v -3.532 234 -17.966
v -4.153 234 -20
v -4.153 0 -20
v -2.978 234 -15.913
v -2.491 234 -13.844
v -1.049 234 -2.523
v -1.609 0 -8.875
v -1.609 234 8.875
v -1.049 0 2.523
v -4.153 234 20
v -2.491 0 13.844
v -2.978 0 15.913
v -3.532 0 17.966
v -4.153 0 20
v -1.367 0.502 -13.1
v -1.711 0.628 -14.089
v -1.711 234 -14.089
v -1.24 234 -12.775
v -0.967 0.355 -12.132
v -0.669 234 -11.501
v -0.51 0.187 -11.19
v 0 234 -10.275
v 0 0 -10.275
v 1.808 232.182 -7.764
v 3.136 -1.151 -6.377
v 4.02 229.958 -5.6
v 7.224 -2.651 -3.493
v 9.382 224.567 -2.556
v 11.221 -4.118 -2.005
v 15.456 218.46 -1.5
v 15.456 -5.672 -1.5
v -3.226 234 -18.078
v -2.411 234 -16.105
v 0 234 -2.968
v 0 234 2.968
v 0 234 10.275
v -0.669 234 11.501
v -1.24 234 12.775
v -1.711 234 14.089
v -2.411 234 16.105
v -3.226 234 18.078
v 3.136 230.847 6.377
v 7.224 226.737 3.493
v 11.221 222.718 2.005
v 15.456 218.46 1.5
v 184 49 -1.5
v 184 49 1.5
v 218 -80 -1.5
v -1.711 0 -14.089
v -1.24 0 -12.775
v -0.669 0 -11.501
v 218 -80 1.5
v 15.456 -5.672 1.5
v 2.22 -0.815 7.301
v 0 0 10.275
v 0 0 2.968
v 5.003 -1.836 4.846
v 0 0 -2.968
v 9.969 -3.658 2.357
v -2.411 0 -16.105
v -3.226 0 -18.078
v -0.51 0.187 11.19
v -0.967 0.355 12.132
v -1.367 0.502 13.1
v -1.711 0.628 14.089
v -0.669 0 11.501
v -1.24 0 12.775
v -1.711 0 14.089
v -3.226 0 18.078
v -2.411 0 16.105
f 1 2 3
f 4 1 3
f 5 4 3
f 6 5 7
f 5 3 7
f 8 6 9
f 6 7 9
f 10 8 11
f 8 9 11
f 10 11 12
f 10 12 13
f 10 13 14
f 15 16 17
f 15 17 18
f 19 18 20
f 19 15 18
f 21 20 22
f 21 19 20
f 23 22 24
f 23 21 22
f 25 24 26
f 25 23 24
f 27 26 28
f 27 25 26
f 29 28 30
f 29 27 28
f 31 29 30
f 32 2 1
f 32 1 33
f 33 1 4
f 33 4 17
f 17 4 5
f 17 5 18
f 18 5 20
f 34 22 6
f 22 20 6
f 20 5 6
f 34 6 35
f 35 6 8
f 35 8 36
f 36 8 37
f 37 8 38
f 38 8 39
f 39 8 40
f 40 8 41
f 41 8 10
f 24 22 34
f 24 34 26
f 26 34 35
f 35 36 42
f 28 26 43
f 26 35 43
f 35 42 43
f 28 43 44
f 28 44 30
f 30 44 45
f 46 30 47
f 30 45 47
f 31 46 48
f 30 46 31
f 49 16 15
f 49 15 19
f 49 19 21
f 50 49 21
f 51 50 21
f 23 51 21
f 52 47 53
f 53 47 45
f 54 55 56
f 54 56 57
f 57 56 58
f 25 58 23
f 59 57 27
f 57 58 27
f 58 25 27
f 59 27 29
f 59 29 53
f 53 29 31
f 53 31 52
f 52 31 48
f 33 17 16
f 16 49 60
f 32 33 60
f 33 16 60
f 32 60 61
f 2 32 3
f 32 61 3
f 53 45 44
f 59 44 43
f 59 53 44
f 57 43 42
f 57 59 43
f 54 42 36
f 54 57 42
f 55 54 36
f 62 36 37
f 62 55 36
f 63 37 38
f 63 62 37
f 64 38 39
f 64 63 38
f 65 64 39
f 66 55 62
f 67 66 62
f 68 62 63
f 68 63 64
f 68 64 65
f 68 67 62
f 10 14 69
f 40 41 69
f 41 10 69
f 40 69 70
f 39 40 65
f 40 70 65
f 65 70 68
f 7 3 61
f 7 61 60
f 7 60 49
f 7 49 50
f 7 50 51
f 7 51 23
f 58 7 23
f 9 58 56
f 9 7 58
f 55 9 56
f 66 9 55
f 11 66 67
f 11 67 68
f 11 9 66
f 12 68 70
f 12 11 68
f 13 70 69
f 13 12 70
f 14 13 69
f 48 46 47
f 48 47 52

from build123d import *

# Parameters (mm, degrees)
BOSS_EXTRUDE1_DEPTH      = 1.5
BOSS_EXTRUDE1_DEPTH_BACK = 1.5
BOSS_EXTRUDE2_DEPTH      = 234
FILLET1_R                = 37
FILLET2_R                = 37
FILLET3_R                = 18
FILLET4_R                = 18


with BuildPart() as part:
    # Sketch1 → Boss-Extrude1 (new, two sides: drawn at the far end of the back side and taken through both)
    with BuildSketch(Plane.XY.offset(-BOSS_EXTRUDE1_DEPTH_BACK)):
        Polygon((0, 0), (0, 234), (184, 49), (218, -80), align=None)
    extrude(amount=BOSS_EXTRUDE1_DEPTH + BOSS_EXTRUDE1_DEPTH_BACK)

    # Sketch3 → Boss-Extrude2 (add)
    with BuildSketch(Plane(origin=(0, 0, 0), x_dir=(1, 0, 0), z_dir=(0, 1, 0))):
        with BuildLine():
            Line((0, 0), (0, 20))
            Line((0, 20), (-4.153415616, 20))
            ThreePointArc((-4.153415616, 20), (-1, 0), (-4.153415616, -20))
            Line((-4.153415616, -20), (0, -20))
            Line((0, -20), (0, 0))
        make_face()
    extrude(amount=BOSS_EXTRUDE2_DEPTH)

    # Fillet1
    # the kernel refuses this fillet: 37 mm, written as the material it takes off along each edge
    with BuildSketch(Plane(origin=(0, -42.580944556, -20), x_dir=(-1, 0, 0), z_dir=(0, 1, 0))) as fillet1_piece_1:
        with BuildLine():
            CenterArc((37, 17.032377822), FILLET1_R, 180, 27.408696588)
            Line((0, 17.032377822), (-0.74, 17.032377822))
            Line((-0.74, 17.032377822), (-0.74, 0))
            Line((-0.74, 0), (0, -0.74))
            ThreePointArc((0, -0.74), (2.076707808, -0.74), (3.496483928, -0.340647556))
            Line((3.496483928, -0.340647556), (4.153415616, 0))
        make_face()
    extrude(amount=319.161889112, mode=Mode.SUBTRACT)

    # Fillet2
    # the kernel refuses this fillet: 37 mm, written as the material it takes off along each edge
    with BuildSketch(Plane(origin=(0, -42.580944556, 20), x_dir=(-1, 0, 0), z_dir=(0, 1, 0))) as fillet2_piece_1:
        with BuildLine():
            CenterArc((37, -17.032377822), FILLET2_R, 152.591303412, 27.408696588)
            Line((0, -17.032377822), (-0.74, -17.032377822))
            Line((-0.74, -17.032377822), (-0.74, 0))
            Line((-0.74, 0), (0, 0.74))
            ThreePointArc((0, 0.74), (2.076707808, 0.74), (3.496483928, 0.340647556))
            Line((3.496483928, 0.340647556), (4.153415616, 0))
        make_face()
    extrude(amount=319.161889112, mode=Mode.SUBTRACT)

    # Fillet3
    # the kernel refuses this fillet: 18 mm, written as the material it adds along each edge
    with BuildSketch(Plane(origin=(0, -38.641156858, 1.5), x_dir=(-0.13467815592130583, 0, 0.990889395602575), z_dir=(0, 1, 0))) as fillet3_piece_1_section:
        with BuildLine():
            CenterArc((15.754361222, 17.739851832), FILLET3_R, 187.740009623, 72.507035508)
            Line((-2.081647899, 15.315645026), (-3.865248811, 15.073224345))
            Line((-3.865248811, 15.073224345), (-1.783600912, -0.242420681))
            Line((-1.783600912, -0.242420681), (0.242420681, -1.783600912))
            ThreePointArc((0.242420681, -1.783600912), (1.696671933, -1.585944264), (12.40023467, -1.773985183))
            Line((12.40023467, -1.773985183), (12.705155265, 0))
        make_face()
    fillet3_piece_1 = extrude(amount=272.641156858, mode=Mode.PRIVATE)
    fillet3_piece_1 = fillet3_piece_1 - Plane(origin=(-66, -0.945349387, 0), x_dir=(0.9514859136040758, 0, -0.3076923076923073), z_dir=(0, -1, 0)) * Cylinder(65, 607, mode=Mode.PRIVATE)
    fillet3_piece_1 = split(fillet3_piece_1, bisect_by=Plane(origin=(6.079958866, -2.231177565, 3.815463773), z_dir=(0.34450770303612605, 0.9387834907734437, 0)), keep=Keep.TOP, mode=Mode.PRIVATE)
    fillet3_piece_1 = split(fillet3_piece_1, bisect_by=Plane(origin=(120.729104933, 112.614758628, 3.815463773), z_dir=(-0.7090204561204898, -0.7051879131144355, 0)), keep=Keep.TOP, mode=Mode.PRIVATE)
    add(fillet3_piece_1)
    with BuildSketch(Plane(origin=(0, 0, 1.5), x_dir=(-0.1346781559213058, 0, 0.990889395602575), z_dir=(0, 1, 0))) as fillet3_piece_2_section:
        with BuildLine():
            CenterArc((15.754361222, 17.739851832), FILLET3_R, 187.740009623, 72.507035508)
            Line((-2.081647899, 15.315645026), (-3.865248811, 15.073224345))
            Line((-3.865248811, 15.073224345), (-1.783600912, -0.242420681))
            Line((-1.783600912, -0.242420681), (0.242420681, -1.783600912))
            ThreePointArc((0.242420681, -1.783600912), (1.696671933, -1.585944264), (12.40023467, -1.773985183))
            Line((12.40023467, -1.773985183), (12.705155265, 0))
        make_face()
    fillet3_piece_2 = extrude(amount=272.641156858, mode=Mode.PRIVATE)
    fillet3_piece_2 = fillet3_piece_2 - Plane(origin=(-66, 0.313964565, 0), x_dir=(0.9514859136040758, 0, -0.3076923076923073), z_dir=(0, -1, 0)) * Cylinder(65, 607, mode=Mode.PRIVATE)
    fillet3_piece_2 = split(fillet3_piece_2, bisect_by=Plane(origin=(-0.982422038, 0.360521849, 12.117700452), z_dir=(-0.34450770303612605, -0.9387834907734437, 0)), keep=Keep.TOP, mode=Mode.PRIVATE)
    add(fillet3_piece_2)

    # Fillet4
    # the kernel refuses this fillet: 18 mm, written as the material it adds along each edge
    with BuildSketch(Plane(origin=(0, -38.641156858, -1.5), x_dir=(-0.1346781559213057, 0, -0.990889395602575), z_dir=(0, 1, 0))) as fillet4_piece_1_section:
        with BuildLine():
            CenterArc((15.754361222, -17.739851832), FILLET4_R, 99.752954869, 72.507035508)
            Line((-2.081647899, -15.315645026), (-3.865248811, -15.073224345))
            Line((-3.865248811, -15.073224345), (-1.783600912, 0.242420681))
            Line((-1.783600912, 0.242420681), (0.242420681, 1.783600912))
            ThreePointArc((0.242420681, 1.783600912), (1.696671933, 1.585944264), (12.40023467, 1.773985183))
            Line((12.40023467, 1.773985183), (12.705155265, 0))
        make_face()
    fillet4_piece_1 = extrude(amount=272.641156858, mode=Mode.PRIVATE)
    fillet4_piece_1 = fillet4_piece_1 - Plane(origin=(-66, -0.945349387, 0), x_dir=(0.9514859136040758, 0, -0.3076923076923073), z_dir=(0, -1, 0)) * Cylinder(65, 607, mode=Mode.PRIVATE)
    fillet4_piece_1 = split(fillet4_piece_1, bisect_by=Plane(origin=(120.729104933, 112.614758628, -3.815463773), z_dir=(-0.709020456120464, -0.7051879131144615, 0)), keep=Keep.TOP, mode=Mode.PRIVATE)
    fillet4_piece_1 = split(fillet4_piece_1, bisect_by=Plane(origin=(6.079958866, -2.231177565, -3.815463773), z_dir=(0.34450770303615846, 0.9387834907734318, 0)), keep=Keep.TOP, mode=Mode.PRIVATE)
    add(fillet4_piece_1)
    with BuildSketch(Plane(origin=(0, 0, -1.5), x_dir=(-0.13467815592130572, 0, -0.990889395602575), z_dir=(0, 1, 0))) as fillet4_piece_2_section:
        with BuildLine():
            CenterArc((15.754361222, -17.739851832), FILLET4_R, 99.752954869, 72.507035508)
            Line((-2.081647899, -15.315645026), (-3.865248811, -15.073224345))
            Line((-3.865248811, -15.073224345), (-1.783600912, 0.242420681))
            Line((-1.783600912, 0.242420681), (0.242420681, 1.783600912))
            ThreePointArc((0.242420681, 1.783600912), (1.696671933, 1.585944264), (12.40023467, 1.773985183))
            Line((12.40023467, 1.773985183), (12.705155265, 0))
        make_face()
    fillet4_piece_2 = extrude(amount=272.641156858, mode=Mode.PRIVATE)
    fillet4_piece_2 = fillet4_piece_2 - Plane(origin=(-66, 0.313964565, 0), x_dir=(0.9514859136040758, 0, -0.3076923076923073), z_dir=(0, -1, 0)) * Cylinder(65, 607, mode=Mode.PRIVATE)
    fillet4_piece_2 = split(fillet4_piece_2, bisect_by=Plane(origin=(-0.982422038, 0.360521849, -12.117700452), z_dir=(-0.34450770303615846, -0.9387834907734318, 0)), keep=Keep.TOP, mode=Mode.PRIVATE)
    add(fillet4_piece_2)


solid = part.part
